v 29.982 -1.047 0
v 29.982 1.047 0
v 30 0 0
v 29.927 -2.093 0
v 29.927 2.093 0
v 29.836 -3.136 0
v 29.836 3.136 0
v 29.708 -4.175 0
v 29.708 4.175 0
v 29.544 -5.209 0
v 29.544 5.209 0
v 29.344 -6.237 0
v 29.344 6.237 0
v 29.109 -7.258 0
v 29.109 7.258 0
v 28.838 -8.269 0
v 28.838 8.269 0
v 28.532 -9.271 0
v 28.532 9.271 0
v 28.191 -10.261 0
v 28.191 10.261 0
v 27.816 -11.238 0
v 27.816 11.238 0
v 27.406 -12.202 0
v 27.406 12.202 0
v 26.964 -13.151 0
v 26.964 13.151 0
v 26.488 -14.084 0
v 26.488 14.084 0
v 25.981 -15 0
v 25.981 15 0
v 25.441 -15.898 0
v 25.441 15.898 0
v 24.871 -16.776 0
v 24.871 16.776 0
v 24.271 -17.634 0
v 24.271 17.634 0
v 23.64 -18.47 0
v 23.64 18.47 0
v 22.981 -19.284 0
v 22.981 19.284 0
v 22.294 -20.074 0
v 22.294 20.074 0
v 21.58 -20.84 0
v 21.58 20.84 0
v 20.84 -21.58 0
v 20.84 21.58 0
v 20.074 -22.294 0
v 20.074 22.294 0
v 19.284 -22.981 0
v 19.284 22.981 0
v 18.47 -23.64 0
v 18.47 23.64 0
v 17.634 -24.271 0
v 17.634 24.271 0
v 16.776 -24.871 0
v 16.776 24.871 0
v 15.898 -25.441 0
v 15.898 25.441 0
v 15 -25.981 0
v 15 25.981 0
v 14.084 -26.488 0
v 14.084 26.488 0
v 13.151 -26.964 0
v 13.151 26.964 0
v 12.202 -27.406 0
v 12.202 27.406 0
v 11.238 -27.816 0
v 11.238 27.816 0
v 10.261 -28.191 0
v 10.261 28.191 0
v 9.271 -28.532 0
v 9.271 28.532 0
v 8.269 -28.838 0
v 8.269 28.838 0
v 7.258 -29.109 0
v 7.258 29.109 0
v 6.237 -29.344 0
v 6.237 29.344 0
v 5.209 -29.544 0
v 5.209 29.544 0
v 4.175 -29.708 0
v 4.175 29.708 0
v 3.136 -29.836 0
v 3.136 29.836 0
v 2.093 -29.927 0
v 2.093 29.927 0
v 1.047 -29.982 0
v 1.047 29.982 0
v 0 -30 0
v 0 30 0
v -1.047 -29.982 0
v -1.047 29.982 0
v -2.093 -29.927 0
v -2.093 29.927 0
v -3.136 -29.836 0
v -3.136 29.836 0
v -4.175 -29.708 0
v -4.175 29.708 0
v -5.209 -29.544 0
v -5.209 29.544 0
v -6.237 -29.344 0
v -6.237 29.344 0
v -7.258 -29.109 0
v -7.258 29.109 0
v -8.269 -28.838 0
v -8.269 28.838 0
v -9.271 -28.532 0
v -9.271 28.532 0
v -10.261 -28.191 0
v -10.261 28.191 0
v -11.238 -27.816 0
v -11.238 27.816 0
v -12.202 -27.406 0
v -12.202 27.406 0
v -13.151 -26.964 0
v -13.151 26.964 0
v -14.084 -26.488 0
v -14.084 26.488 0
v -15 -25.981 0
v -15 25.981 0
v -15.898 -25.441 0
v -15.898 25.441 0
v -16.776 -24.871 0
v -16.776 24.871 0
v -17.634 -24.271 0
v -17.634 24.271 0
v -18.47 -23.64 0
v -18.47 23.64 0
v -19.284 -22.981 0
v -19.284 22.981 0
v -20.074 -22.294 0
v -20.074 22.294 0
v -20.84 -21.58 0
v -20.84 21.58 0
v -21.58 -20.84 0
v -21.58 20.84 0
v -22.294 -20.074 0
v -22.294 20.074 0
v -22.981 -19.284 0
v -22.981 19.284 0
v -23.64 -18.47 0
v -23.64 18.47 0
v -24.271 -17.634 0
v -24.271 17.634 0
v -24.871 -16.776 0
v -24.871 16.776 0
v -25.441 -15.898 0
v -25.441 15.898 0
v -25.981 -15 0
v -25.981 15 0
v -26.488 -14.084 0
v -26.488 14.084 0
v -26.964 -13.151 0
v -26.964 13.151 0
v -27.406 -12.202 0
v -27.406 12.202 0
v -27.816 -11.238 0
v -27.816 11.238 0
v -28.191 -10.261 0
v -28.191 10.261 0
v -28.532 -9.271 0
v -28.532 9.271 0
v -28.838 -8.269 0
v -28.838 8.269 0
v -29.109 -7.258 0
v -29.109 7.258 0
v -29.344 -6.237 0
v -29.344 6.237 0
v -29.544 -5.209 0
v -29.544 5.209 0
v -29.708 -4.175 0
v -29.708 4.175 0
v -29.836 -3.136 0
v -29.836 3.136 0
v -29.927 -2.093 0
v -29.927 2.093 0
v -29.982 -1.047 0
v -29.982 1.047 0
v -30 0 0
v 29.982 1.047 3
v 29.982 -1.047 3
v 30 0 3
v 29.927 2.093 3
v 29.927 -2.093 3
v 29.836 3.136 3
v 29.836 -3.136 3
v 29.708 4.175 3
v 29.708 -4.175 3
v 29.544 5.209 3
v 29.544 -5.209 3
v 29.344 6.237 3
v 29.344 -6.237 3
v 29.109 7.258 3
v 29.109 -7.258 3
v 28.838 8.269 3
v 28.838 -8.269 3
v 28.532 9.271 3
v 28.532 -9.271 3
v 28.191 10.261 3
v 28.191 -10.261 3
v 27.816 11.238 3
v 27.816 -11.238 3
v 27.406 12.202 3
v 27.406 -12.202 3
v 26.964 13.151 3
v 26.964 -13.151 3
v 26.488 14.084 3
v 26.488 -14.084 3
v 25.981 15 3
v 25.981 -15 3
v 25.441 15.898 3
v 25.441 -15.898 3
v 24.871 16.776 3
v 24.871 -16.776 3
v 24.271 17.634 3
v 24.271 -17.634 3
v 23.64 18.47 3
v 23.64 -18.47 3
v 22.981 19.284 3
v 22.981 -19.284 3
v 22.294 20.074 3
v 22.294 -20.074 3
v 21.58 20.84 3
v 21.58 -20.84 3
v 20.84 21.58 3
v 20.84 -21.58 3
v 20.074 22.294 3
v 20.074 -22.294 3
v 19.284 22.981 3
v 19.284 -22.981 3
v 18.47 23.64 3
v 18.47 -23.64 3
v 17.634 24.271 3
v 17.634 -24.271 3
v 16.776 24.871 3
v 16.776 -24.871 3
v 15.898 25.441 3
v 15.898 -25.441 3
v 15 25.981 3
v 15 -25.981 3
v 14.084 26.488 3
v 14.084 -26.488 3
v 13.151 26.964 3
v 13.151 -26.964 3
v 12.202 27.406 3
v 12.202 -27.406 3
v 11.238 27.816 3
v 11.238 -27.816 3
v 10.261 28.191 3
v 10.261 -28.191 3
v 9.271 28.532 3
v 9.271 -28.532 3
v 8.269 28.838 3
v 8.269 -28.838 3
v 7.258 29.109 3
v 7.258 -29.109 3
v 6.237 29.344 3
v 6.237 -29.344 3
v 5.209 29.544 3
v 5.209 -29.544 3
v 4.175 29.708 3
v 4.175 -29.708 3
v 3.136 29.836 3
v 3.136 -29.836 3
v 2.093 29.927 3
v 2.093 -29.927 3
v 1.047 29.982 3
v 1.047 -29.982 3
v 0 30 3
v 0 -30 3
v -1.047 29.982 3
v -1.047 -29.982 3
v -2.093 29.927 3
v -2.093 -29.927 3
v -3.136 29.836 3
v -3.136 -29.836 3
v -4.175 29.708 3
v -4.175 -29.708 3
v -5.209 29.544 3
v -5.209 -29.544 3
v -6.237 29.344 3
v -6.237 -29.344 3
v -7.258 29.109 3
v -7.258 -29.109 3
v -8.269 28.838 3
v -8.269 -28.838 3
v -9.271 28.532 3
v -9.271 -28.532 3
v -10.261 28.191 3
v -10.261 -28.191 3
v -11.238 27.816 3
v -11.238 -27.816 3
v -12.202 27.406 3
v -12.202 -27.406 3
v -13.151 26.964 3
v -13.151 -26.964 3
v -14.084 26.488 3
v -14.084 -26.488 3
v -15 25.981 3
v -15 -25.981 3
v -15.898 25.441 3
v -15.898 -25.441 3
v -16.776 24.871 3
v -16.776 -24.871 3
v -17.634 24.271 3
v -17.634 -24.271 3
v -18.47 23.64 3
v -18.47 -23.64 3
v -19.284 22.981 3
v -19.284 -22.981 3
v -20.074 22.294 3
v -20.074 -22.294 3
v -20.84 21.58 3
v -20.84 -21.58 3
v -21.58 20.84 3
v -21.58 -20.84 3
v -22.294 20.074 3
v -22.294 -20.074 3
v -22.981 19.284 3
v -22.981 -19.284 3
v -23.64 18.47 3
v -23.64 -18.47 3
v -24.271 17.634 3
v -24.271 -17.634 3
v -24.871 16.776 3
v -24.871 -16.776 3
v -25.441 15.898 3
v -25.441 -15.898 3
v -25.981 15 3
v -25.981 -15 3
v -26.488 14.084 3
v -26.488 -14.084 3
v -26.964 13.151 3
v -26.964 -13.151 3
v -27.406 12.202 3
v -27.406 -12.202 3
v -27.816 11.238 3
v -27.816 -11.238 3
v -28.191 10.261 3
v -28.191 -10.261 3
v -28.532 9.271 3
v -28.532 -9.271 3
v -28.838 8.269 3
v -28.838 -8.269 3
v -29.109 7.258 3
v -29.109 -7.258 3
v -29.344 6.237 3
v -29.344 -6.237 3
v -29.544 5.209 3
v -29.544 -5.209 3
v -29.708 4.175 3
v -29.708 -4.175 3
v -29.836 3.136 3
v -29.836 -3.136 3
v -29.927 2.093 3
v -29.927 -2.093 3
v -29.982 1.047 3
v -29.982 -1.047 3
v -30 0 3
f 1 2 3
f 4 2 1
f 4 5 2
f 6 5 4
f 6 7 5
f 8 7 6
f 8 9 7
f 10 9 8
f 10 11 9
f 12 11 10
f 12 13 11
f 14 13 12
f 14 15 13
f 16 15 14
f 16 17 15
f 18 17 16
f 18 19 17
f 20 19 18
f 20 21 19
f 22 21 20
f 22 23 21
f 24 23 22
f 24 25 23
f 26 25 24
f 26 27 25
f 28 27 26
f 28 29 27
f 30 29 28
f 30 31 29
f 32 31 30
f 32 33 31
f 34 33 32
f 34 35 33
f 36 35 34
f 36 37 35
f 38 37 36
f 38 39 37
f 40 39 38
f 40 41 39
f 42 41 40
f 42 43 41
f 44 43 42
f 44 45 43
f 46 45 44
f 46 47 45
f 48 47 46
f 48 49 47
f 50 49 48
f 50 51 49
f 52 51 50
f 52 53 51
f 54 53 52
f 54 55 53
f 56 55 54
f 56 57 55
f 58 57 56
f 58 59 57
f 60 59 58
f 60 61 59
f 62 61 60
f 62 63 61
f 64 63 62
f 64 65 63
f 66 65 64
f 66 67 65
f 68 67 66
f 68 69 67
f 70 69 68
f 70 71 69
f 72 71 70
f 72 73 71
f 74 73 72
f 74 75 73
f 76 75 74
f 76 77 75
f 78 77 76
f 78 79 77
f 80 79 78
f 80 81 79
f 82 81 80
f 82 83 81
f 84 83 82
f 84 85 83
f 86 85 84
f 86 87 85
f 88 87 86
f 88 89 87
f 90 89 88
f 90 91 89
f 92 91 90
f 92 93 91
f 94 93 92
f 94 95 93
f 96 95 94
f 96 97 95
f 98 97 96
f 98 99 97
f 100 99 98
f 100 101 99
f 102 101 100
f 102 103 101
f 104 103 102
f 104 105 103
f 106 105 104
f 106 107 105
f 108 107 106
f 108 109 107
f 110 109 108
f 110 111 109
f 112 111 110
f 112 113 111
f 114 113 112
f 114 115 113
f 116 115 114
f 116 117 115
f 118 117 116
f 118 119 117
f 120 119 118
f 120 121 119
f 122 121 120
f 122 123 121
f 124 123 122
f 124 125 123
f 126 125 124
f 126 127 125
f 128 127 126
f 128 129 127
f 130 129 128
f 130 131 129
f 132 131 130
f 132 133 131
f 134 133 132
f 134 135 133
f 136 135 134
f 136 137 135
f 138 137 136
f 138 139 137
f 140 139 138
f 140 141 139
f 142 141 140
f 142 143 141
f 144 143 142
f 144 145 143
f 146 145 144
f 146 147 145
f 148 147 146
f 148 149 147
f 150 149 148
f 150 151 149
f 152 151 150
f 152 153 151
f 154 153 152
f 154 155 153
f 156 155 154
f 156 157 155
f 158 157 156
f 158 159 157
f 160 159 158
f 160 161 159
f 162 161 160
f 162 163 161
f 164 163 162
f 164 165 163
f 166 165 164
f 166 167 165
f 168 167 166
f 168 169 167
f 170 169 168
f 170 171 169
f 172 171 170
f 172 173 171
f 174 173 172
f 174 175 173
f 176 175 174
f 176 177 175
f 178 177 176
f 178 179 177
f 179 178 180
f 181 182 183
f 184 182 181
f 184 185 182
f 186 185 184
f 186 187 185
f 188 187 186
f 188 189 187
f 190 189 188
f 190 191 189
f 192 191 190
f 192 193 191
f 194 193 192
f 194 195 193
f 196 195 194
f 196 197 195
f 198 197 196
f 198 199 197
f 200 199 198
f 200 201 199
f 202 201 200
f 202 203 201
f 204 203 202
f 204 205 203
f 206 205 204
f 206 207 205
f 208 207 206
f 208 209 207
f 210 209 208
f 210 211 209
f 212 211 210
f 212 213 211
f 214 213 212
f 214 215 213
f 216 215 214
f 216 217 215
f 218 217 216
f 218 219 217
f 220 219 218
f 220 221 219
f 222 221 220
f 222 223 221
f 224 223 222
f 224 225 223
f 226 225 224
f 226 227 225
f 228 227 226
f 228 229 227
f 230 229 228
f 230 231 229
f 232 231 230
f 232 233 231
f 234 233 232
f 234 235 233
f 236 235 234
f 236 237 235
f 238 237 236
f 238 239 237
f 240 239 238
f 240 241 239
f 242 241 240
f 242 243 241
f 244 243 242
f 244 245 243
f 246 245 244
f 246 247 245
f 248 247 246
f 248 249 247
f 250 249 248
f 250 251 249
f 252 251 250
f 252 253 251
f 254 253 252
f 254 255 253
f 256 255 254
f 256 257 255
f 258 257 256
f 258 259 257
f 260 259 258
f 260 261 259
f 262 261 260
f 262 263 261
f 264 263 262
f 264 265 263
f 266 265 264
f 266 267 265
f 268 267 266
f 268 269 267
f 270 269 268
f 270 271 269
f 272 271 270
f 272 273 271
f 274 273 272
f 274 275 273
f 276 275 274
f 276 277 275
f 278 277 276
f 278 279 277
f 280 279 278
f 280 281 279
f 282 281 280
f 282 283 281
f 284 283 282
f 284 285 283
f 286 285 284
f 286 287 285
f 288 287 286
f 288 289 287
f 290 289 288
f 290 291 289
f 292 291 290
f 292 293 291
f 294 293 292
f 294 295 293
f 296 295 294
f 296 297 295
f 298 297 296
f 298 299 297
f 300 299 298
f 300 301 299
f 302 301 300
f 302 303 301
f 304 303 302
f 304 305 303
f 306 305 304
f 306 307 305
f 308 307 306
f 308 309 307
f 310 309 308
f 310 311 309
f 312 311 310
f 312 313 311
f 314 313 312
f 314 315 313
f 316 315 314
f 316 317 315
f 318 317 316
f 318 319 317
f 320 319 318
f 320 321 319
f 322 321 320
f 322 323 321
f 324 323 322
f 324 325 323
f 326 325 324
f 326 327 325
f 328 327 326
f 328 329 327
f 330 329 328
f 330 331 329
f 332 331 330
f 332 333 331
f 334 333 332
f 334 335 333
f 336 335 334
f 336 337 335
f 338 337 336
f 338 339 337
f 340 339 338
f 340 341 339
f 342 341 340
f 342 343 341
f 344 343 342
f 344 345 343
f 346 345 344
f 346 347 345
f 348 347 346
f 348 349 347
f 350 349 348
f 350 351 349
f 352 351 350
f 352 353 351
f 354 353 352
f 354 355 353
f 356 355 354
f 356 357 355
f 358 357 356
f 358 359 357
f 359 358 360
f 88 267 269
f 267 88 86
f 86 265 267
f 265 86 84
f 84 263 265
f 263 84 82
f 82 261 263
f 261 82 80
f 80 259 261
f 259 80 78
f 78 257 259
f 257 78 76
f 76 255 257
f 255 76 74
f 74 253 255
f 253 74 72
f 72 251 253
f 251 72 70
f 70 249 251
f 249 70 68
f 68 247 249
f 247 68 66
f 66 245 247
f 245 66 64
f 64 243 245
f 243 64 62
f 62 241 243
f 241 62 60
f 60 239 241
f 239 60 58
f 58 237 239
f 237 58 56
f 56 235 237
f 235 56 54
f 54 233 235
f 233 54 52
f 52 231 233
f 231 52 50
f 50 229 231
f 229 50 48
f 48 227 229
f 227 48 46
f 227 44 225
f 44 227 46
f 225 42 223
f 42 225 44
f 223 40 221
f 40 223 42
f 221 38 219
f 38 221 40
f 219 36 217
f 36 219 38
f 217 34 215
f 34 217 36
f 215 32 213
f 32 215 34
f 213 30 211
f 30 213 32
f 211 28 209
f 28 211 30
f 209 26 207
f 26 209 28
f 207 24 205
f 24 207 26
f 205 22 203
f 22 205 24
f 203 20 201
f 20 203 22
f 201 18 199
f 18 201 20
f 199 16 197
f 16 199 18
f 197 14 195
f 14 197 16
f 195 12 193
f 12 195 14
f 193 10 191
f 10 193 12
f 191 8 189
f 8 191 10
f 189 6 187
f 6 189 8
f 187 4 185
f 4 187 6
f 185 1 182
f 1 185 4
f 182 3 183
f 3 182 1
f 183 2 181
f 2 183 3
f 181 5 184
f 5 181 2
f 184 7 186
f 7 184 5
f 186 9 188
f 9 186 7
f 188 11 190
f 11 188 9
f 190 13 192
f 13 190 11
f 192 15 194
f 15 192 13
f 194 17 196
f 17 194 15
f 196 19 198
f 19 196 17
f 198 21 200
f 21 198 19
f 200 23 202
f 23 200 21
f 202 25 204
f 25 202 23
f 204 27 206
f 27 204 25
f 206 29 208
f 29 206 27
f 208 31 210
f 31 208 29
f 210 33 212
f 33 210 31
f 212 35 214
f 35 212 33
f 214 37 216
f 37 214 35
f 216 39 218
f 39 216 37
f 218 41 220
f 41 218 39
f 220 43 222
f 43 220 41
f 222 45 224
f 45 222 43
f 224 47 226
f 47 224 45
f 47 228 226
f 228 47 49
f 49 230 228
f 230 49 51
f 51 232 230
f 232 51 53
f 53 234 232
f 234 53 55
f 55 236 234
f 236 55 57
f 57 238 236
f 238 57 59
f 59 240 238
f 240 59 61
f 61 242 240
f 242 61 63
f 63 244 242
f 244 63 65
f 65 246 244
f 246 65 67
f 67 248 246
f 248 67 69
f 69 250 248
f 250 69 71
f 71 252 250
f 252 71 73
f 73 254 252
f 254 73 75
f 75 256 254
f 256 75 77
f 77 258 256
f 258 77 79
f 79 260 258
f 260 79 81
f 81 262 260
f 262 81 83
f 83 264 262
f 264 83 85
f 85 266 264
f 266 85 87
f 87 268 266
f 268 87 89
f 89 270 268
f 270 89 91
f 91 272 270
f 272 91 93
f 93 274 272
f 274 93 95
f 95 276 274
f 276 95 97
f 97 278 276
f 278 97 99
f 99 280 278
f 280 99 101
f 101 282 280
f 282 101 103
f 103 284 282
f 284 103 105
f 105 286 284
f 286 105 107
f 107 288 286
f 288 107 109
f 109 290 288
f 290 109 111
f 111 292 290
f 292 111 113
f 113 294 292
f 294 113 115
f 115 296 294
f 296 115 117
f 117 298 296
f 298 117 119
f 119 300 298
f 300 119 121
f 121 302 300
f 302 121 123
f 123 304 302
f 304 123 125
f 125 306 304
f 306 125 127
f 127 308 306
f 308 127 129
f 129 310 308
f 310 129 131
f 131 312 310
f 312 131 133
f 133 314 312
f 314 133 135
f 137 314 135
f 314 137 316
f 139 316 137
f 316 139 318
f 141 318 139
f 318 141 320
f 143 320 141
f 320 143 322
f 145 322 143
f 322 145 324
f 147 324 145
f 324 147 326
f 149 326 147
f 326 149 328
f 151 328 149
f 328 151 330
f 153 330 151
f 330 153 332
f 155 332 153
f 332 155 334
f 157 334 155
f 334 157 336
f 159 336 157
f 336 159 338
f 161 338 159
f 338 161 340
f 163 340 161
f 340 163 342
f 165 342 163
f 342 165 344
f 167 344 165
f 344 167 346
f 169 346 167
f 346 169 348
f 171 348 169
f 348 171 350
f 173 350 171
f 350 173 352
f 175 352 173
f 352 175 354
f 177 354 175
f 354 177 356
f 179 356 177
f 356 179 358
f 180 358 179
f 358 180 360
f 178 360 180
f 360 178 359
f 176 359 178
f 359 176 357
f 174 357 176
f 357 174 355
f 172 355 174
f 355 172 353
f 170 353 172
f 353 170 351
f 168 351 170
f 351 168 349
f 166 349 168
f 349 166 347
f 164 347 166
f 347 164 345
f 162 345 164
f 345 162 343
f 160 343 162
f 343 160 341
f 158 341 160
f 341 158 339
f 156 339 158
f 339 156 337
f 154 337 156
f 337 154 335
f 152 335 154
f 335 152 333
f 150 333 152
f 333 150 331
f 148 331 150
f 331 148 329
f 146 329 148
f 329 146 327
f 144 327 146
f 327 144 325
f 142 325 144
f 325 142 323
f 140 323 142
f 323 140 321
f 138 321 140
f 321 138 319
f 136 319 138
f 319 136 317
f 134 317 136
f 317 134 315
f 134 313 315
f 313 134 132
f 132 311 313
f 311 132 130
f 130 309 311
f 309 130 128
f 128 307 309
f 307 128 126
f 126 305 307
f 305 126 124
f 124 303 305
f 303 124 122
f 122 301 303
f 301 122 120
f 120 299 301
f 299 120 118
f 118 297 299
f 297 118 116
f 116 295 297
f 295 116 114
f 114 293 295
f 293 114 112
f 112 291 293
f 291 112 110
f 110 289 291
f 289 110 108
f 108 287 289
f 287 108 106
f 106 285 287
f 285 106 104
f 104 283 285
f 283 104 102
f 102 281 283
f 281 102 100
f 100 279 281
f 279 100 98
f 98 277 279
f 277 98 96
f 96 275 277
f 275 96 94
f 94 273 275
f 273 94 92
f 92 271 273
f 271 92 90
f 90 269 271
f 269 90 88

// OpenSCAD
/* =========================================================================
   SPIKE — não é o modelo, é o teste que decide se o modelo é possível.

   A dúvida: o OpenSCAD faz union implícito dentro de `for`, e há relato de
   que isso funde tudo num objeto só no 3MF — as cores aparecem no prato mas
   todas as partes caem no filamento 1, sem reatribuição possível. A flag
   `--enable=lazy-union`, que resolveria, não existe no Parametric Model Maker.
   Uma mandala é `for` radial por definição, então isso nos acerta em cheio.

   A hipótese a testar: agrupar por COR no topo (`color(c) for(...)`) em vez
   de trocar de cor dentro do laço produz um sólido fechado por cor — a mesma
   invariante que o gerador principal já persegue.

   Como usar: subir no PMM, gerar o 3MF, abrir no Bambu Studio e conferir
     1. aparecem TRÊS filamentos em Project Filaments?
     2. dá para reatribuir o filamento de cada anel independentemente?
     3. quanto tempo o backend levou?

   De quebra testa se a anotação `// color` vira mesmo seletor na tela.
   ========================================================================= */

/* [Cores] */
cor_fundo = "#b02318";   // color
cor_petala = "#f2c94c";  // color
cor_ponto = "#e8833a";   // color

/* [Peça] */
diametro = 60;           // [40:150]
repeticoes = 12;         // [6:24]

/* [Hidden] */
H = 3;                   // espessura, fixa
R = diametro / 2;

r_ponto  = R * 0.72;
rad_ponto = R * 0.10;
r_petala = R * 0.40;

module ponto2d()
  translate([r_ponto, 0]) circle(r = rad_ponto, $fn = 48);

module petala2d()
  translate([r_petala, 0]) scale([1, 0.42]) circle(r = R * 0.26, $fn = 64);

// os dois anéis, cada um como um módulo próprio: é o mesmo `for` que o
// modelo real vai usar, e é justamente ele que está sob suspeita
module anel_pontos()
  for (i = [0 : repeticoes - 1]) rotate(i * 360 / repeticoes) ponto2d();

module anel_petalas()
  for (i = [0 : repeticoes - 1]) rotate(i * 360 / repeticoes + 180 / repeticoes) petala2d();

// ---- um `color()` no topo por cor, e o `for` DENTRO dele ----------------

// fundo: a placa com as regiões dos outros dois vazadas, para os três
// sólidos se encaixarem sem se sobrepor e o topo ficar plano
color(cor_fundo)
  linear_extrude(height = H)
    difference() {
      circle(r = R, $fn = 180);
      anel_petalas();
      anel_pontos();
    }

color(cor_petala) linear_extrude(height = H) anel_petalas();
color(cor_ponto)  linear_extrude(height = H) anel_pontos();
